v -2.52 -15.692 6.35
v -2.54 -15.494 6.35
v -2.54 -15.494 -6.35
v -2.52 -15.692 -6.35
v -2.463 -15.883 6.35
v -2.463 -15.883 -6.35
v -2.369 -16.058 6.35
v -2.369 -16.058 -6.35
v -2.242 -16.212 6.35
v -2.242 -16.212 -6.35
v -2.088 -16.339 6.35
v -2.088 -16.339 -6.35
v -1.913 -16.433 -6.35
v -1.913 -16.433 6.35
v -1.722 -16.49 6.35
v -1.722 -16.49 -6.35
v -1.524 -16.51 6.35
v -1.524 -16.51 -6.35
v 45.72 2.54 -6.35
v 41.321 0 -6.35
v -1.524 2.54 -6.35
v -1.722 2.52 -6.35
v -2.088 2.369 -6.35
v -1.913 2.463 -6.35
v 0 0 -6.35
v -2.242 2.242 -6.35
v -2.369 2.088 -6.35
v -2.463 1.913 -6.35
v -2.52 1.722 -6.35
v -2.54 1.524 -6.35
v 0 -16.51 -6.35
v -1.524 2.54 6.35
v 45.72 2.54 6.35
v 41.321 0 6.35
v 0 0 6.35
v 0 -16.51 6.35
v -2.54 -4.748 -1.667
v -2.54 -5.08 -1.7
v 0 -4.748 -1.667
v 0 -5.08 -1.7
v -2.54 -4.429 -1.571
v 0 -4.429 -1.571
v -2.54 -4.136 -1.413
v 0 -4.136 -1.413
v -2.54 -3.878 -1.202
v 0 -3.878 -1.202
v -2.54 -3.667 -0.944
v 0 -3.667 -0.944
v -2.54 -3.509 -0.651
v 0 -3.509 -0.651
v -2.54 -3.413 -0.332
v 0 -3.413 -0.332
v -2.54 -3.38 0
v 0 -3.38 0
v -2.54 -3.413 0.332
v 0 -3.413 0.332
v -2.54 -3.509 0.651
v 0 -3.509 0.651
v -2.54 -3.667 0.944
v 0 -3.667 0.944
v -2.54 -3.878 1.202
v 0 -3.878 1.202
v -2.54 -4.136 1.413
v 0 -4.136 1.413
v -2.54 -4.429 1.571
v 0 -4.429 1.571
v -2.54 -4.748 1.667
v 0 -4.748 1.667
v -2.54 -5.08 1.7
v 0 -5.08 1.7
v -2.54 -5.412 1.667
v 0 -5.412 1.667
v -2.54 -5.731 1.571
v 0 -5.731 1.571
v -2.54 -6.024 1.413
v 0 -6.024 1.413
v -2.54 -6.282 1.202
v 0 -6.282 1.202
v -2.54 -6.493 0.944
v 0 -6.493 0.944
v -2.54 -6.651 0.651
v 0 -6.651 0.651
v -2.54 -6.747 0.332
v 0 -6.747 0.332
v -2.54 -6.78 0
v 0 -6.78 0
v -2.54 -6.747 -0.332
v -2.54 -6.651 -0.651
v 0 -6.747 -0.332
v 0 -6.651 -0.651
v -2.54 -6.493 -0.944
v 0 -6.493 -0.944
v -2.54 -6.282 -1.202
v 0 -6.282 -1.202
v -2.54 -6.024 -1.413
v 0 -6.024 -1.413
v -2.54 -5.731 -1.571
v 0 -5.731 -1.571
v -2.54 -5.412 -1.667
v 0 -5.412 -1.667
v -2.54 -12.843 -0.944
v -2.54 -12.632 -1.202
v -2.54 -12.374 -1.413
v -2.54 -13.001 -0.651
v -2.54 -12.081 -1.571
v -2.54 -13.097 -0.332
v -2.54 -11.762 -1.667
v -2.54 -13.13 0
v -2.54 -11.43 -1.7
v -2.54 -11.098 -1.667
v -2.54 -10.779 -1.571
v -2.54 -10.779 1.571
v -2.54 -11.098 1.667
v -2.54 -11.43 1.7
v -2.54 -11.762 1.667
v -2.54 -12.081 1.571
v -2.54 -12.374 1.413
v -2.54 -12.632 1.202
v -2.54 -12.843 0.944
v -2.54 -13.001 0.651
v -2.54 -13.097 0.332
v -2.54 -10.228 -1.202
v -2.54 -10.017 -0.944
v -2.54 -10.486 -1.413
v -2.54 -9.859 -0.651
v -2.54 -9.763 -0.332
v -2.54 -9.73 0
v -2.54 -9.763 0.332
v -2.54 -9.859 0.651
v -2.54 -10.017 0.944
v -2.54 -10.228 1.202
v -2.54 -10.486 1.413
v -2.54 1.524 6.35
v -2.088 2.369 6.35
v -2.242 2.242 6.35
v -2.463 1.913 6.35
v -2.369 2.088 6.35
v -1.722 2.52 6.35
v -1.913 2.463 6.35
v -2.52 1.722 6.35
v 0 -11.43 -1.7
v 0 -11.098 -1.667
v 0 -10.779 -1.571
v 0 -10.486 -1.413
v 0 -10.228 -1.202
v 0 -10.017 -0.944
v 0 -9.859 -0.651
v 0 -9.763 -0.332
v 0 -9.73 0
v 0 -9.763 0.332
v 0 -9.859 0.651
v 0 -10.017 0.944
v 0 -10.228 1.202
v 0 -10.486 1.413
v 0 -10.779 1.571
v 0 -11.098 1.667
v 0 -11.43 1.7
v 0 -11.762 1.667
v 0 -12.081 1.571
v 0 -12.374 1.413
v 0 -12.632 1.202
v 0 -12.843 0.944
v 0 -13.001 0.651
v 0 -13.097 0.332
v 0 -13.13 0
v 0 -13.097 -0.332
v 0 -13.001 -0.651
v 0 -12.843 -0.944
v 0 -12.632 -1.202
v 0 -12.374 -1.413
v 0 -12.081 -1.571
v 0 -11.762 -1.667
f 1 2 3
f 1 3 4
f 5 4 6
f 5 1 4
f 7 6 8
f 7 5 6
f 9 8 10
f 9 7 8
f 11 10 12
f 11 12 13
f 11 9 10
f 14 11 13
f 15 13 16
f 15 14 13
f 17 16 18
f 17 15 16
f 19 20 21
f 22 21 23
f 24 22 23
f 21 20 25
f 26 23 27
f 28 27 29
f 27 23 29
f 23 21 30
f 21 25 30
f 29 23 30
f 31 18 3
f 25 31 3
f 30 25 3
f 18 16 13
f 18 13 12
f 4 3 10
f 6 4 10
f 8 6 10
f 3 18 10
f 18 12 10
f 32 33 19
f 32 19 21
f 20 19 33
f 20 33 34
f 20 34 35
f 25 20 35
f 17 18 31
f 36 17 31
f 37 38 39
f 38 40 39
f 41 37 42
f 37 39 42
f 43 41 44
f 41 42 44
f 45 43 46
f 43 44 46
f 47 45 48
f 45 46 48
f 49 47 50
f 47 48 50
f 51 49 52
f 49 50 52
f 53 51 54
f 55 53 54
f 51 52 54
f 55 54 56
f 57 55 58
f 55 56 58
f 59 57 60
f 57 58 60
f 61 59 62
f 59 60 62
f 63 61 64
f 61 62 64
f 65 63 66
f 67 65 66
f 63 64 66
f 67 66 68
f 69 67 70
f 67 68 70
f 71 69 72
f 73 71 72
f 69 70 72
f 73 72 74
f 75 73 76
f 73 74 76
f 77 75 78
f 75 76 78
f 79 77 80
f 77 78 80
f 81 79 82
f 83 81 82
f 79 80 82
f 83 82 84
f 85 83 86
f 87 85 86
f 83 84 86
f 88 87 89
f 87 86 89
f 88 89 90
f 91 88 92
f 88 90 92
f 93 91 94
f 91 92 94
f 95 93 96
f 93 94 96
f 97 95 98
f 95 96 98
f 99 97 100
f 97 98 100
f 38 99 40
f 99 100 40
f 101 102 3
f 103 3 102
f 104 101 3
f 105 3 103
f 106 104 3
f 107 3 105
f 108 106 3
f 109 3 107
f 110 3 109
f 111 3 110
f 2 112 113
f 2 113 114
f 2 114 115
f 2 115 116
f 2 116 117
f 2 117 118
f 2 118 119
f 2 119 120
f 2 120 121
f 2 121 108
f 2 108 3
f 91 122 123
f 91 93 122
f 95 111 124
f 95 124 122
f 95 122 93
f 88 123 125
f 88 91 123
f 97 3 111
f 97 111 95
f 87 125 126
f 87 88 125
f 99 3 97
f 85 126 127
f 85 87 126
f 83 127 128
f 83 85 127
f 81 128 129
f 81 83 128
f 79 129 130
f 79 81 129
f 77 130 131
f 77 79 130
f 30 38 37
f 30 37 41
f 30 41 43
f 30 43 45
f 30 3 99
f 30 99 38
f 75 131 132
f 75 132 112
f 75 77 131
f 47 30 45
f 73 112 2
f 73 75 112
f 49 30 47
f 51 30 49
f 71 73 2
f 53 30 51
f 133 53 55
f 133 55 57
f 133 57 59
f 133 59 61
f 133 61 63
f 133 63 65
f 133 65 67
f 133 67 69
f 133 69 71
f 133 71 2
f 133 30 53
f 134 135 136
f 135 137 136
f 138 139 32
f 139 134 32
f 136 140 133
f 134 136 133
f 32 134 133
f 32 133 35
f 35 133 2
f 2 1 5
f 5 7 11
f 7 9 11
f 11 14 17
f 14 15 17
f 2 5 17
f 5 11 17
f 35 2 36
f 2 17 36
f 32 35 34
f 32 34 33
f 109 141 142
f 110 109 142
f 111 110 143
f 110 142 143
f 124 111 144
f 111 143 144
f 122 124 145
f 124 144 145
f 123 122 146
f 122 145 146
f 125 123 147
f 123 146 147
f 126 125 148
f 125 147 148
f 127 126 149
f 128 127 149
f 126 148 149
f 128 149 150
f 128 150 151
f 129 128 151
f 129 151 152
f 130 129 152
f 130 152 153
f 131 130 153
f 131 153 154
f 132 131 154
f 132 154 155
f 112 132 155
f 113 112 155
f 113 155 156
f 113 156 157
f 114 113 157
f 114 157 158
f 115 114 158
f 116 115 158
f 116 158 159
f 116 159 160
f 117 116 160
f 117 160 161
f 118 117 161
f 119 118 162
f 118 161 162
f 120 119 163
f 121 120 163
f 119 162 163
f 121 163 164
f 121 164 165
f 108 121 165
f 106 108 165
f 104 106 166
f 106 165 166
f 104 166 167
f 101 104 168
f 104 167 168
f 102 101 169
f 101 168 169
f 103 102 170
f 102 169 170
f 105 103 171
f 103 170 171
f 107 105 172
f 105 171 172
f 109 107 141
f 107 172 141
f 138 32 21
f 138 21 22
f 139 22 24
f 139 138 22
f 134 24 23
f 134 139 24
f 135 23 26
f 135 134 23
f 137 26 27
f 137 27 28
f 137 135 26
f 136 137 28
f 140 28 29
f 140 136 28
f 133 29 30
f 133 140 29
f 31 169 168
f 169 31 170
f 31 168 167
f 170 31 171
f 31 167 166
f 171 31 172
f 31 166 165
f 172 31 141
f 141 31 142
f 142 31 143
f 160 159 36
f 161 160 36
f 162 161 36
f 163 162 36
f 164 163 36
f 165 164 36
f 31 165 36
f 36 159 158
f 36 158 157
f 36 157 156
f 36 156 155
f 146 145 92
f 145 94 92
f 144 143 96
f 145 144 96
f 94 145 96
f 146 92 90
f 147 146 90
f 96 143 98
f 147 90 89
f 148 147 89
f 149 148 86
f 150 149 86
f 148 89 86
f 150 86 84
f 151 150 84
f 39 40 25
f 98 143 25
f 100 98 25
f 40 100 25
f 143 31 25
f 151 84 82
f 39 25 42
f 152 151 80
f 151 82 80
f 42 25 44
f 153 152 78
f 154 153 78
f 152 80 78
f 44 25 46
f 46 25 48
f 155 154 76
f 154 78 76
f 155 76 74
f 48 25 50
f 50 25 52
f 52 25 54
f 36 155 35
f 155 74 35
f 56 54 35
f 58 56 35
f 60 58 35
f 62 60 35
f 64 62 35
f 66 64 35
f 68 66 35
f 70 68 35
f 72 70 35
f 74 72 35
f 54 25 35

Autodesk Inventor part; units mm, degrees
ref_plane "YZ Plane" through (0, 0, 0) normal (1, 0, 0) x (0, 1, 0)
ref_plane "XZ Plane" through (0, 0, 0) normal (0, 1, 0) x (-1, 0, 0)
ref_plane "XY Plane" through (0, 0, 0) normal (0, 0, 1) x (1, 0, 0)
sketch "Sketch1" plane through (0, 0, 0) normal (0, 1, 0) x (-1, 0, 0)
  line L0 (0, 6.35) -> (-45.72, 6.35)
  line L1 (-45.72, 6.35) -> (-45.72, -6.35)
  line L2 (-45.72, -6.35) -> (0, -6.35)
  line L3 (0, -6.35) -> (0, 6.35)
  point P0 (0, 0)
  dimension "d0" = 45.72
  dimension "d1" = 12.7
  dimension "d2" = 6.35
extrude "Extrusion1" add sketch "Sketch1" along normal blind 2.54
sketch "Sketch2" plane through (0, 2.54, 0) normal (0, 1, 0) x (1, 0, 0)
  line L0 (0, 6.35) -> (0, -6.35) projected
  line L1 (0, 6.35) -> (-2.54, 6.35)
  line L2 (-2.54, 6.35) -> (-2.54, -6.35)
  line L3 (-2.54, -6.35) -> (0, -6.35)
  line L4 (0, -6.35) -> (0, 6.35)
  point P0 (0, 0)
  point P1 (0, -6.35)
  dimension "d5" = 2.54
extrude "Extrusion2" add sketch "Sketch2" against normal blind 19.05
sketch "Sketch3" plane through (0, -16.51, 6.35) normal (1, 0, 0) x (0, 0, -1)
  circle A0 centre (6.35, 11.43) radius 1.7
  circle A1 centre (6.35, 5.08) radius 1.7
  line L0 (12.7, 16.51) -> (0, 16.51) projected
  point P0 (6.35, 16.51)
  dimension "d8" = 3.4
  dimension "d9" = 3.4
  dimension "d10" = 5.08
  dimension "d11" = 6.35
extrude "Extrusion3" cut sketch "Sketch3" against normal through all
fillet "Fillet1" radius 1.016 2 edges at (-2.54, 2.54, 0) (-2.54, -16.51, 0)
sketch "Sketch4" plane through (45.72, 0, 6.35) normal (0, 0, 1) x (1, 0, 0)
  line L0 (0, 0) -> (0, 2.54) projected
  line L1 (0, 2.54) -> (-4.3994, 0)
  line L2 (-45.72, 0) -> (0, 0) projected
  line L3 (0, 2.54) -> (5.08, 2.54) construction
  line L4 (-4.3994, 0) -> (0, 0)
  line L5 (0, 0) -> (0, 2.54)
  dimension "d15" = 150
extrude "Extrusion4" cut sketch "Sketch4" against normal through all
equation "\"d2\" = 0.5 * d1"
properties part number "capstone ear"
